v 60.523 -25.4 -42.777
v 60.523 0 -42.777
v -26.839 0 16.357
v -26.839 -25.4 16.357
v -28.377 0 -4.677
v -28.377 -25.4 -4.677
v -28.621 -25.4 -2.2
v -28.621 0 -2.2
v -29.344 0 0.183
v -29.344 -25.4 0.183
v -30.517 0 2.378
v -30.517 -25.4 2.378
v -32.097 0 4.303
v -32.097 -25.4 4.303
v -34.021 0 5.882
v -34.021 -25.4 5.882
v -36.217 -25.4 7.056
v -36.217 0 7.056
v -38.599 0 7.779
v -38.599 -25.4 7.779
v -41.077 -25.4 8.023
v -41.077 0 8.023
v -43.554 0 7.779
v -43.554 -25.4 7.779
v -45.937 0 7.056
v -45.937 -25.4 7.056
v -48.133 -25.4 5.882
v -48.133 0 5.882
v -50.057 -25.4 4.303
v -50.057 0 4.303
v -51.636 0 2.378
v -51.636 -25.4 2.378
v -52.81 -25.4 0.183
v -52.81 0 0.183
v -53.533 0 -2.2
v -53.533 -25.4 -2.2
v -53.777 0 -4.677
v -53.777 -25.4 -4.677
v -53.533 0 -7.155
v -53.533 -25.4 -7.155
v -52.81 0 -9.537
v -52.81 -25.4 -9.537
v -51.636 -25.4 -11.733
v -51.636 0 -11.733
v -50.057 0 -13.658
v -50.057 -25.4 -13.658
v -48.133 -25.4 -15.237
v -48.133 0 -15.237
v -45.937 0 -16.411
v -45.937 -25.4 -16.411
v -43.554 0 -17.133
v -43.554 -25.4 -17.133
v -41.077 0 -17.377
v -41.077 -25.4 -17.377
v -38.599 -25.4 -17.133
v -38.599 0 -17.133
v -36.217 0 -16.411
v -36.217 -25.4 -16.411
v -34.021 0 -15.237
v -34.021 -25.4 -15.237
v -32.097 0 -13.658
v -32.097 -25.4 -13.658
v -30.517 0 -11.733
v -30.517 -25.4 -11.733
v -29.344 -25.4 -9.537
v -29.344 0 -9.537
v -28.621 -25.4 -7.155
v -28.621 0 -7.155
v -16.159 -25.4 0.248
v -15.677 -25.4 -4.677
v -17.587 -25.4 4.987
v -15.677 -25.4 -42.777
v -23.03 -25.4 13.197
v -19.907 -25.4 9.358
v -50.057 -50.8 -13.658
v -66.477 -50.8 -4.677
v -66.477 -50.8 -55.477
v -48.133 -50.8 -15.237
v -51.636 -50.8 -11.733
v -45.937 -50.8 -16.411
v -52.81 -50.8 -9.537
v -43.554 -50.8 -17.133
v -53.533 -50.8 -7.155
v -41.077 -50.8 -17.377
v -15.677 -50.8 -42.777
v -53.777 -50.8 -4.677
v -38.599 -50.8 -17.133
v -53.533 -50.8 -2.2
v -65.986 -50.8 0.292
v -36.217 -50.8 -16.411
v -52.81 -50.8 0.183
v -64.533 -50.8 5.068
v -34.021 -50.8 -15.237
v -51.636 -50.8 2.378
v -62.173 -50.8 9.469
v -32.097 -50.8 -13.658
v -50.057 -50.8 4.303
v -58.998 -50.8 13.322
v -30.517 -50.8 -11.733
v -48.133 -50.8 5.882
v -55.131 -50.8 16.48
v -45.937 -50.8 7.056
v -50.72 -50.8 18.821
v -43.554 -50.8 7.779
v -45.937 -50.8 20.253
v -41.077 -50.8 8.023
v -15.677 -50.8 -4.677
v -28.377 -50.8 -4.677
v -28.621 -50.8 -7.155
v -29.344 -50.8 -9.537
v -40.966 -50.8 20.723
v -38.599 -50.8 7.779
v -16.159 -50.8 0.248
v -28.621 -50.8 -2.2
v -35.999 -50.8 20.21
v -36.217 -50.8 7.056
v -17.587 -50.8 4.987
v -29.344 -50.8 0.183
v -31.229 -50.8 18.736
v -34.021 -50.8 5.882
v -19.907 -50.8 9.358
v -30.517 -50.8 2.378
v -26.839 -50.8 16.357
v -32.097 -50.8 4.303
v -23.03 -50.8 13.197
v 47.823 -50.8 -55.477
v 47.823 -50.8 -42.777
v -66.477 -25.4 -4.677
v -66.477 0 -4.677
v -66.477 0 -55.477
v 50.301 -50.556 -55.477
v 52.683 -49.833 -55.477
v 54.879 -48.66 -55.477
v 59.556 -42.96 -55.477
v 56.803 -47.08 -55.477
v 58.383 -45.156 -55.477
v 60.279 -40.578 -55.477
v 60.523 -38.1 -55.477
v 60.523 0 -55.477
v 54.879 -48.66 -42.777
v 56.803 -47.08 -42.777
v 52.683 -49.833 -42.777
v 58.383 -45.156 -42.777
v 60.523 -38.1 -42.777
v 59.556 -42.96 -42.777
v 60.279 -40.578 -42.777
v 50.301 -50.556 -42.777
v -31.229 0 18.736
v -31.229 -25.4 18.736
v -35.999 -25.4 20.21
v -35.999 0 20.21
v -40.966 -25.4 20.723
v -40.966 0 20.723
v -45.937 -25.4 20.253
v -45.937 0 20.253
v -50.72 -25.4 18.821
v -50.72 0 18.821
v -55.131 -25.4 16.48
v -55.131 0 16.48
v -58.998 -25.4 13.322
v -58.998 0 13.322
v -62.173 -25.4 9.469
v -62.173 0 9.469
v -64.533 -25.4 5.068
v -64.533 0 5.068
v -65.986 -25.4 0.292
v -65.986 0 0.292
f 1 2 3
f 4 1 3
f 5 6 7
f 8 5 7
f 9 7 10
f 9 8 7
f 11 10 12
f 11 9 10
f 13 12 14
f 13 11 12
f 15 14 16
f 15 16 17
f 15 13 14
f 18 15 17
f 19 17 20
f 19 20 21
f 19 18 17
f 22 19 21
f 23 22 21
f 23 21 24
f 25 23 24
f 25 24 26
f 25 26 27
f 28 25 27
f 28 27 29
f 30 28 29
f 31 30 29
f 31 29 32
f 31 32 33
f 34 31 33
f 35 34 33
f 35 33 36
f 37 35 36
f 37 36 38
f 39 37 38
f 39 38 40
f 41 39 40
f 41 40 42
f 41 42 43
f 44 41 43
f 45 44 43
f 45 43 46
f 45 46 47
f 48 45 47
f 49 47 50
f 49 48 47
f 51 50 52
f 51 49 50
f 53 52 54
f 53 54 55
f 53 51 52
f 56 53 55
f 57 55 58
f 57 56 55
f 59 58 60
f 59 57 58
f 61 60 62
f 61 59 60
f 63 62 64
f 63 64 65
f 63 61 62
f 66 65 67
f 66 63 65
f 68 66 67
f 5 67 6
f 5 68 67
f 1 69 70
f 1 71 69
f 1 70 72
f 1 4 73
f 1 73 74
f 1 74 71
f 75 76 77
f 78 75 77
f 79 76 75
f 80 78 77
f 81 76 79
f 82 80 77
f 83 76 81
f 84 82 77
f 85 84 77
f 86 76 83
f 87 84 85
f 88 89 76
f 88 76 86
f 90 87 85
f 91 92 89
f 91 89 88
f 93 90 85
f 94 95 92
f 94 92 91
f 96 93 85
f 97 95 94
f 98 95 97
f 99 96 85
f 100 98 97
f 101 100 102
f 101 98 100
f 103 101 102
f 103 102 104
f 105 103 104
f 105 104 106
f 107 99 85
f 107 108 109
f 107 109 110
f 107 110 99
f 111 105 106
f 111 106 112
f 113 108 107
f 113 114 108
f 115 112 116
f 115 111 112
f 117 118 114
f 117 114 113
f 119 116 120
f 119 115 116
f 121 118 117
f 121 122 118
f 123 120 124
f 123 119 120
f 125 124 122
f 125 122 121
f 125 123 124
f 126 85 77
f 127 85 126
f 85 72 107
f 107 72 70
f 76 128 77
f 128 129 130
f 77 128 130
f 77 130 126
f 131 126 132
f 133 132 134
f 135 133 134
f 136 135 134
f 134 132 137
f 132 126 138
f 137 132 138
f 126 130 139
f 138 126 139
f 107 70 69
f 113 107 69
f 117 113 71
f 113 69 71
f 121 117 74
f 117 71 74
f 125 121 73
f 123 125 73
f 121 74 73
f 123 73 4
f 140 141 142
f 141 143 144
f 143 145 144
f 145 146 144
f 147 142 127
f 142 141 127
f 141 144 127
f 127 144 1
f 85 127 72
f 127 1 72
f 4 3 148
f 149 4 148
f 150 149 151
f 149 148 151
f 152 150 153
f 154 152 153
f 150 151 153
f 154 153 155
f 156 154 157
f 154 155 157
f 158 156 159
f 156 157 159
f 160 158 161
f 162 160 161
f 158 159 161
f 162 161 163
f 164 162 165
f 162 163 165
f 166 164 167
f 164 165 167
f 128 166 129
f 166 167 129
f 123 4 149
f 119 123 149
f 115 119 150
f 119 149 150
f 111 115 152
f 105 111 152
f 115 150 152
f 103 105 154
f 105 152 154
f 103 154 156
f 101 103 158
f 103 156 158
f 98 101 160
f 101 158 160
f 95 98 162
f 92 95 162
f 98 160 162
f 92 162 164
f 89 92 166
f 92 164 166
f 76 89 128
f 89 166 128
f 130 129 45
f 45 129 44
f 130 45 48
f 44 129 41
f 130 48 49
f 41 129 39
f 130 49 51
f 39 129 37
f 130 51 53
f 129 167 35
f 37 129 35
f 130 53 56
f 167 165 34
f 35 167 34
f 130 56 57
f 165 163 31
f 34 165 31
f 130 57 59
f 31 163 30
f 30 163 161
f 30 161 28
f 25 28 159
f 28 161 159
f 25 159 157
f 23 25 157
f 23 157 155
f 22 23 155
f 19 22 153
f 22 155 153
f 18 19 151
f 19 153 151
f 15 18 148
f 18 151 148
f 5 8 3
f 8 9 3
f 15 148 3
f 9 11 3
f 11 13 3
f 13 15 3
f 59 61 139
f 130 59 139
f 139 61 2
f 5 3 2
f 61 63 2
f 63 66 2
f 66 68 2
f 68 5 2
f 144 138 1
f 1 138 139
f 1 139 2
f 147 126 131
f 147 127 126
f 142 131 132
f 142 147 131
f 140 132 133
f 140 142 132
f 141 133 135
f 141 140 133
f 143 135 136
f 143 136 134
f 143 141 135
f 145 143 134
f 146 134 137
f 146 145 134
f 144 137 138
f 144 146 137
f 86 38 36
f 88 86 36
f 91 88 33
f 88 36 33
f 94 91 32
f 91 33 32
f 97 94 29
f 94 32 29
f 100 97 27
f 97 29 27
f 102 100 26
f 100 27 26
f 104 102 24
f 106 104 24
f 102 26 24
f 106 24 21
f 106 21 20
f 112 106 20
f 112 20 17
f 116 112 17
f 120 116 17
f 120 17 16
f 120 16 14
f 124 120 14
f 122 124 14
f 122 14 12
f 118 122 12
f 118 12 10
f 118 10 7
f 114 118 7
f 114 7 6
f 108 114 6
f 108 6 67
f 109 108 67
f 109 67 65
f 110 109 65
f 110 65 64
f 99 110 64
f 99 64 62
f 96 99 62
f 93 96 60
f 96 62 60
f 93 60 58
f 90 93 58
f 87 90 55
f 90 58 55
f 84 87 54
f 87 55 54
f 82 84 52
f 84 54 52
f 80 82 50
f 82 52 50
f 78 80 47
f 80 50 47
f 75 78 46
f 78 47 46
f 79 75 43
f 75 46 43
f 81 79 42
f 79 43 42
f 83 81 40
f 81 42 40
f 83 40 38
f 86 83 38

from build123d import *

# Parameters (mm, degrees)
F0_R     = 12.7
F1_DEPTH = 25.4
F3_DEPTH = 25.4
F4_DEPTH = 25.4
F5_R     = 12.7


with BuildPart() as f1:
    # F0 (on Front) → F1 (new body)
    with BuildSketch(Plane.XZ):
        with BuildLine():
            Line((60.523228, -42.777247), (-26.838899, 16.357082))
            ThreePointArc((-26.838899, 16.357082), (-52.983031, 17.759353), (-66.476772, -4.677247))
            Line((-66.476772, -4.677247), (-66.476772, -55.477247))
            Line((-66.476772, -55.477247), (60.523228, -55.477247))
            Line((60.523228, -55.477247), (60.523228, -42.777247))
        make_face()
        with Locations((-41.076772, -4.677247)):
            Circle(F0_R, mode=Mode.SUBTRACT)
    extrude(amount=F1_DEPTH)

    # F2 (on face) → F3 (join)
    with BuildSketch(Plane.XZ.offset(25.4)):
        with BuildLine():
            Line((-15.676772, -4.677247), (-28.376772, -4.677247))
            ThreePointArc((-28.376772, -4.677247), (-41.076772, -17.377247), (-53.776772, -4.677247))
            Line((-53.776772, -4.677247), (-66.476772, -4.677247))
            ThreePointArc((-66.476772, -4.677247), (-41.076772, -30.077247), (-15.676772, -4.677247))
        make_face()
        with BuildLine():
            ThreePointArc((-53.776772, -4.677247), (-41.076772, 8.022753), (-28.376772, -4.677247))
            Line((-28.376772, -4.677247), (-15.676772, -4.677247))
            ThreePointArc((-15.676772, -4.677247), (-41.076772, 20.722753), (-66.476772, -4.677247))
            Line((-66.476772, -4.677247), (-53.776772, -4.677247))
        make_face()
    extrude(amount=F3_DEPTH)

    # F2 (on face) → F4 (join)
    with BuildSketch(Plane.XZ.offset(25.4)):
        with BuildLine():
            Line((-15.676772, -4.677247), (-28.376772, -4.677247))
            ThreePointArc((-28.376772, -4.677247), (-41.076772, -17.377247), (-53.776772, -4.677247))
            Line((-53.776772, -4.677247), (-66.476772, -4.677247))
            ThreePointArc((-66.476772, -4.677247), (-41.076772, -30.077247), (-15.676772, -4.677247))
        make_face()
        with BuildLine():
            ThreePointArc((-53.776772, -4.677247), (-41.076772, 8.022753), (-28.376772, -4.677247))
            Line((-28.376772, -4.677247), (-15.676772, -4.677247))
            ThreePointArc((-15.676772, -4.677247), (-18.640173, 7.229013), (-26.838899, 16.357082))
            ThreePointArc((-26.838899, 16.357082), (-52.983031, 17.759353), (-66.476772, -4.677247))
            Line((-66.476772, -4.677247), (-53.776772, -4.677247))
        make_face()
        with BuildLine():
            Line((-15.676772, -42.777247), (-15.676772, -4.677247))
            ThreePointArc((-15.676772, -4.677247), (-41.076772, -30.077247), (-66.476772, -4.677247))
            Line((-66.476772, -4.677247), (-66.476772, -42.777247))
            Line((-66.476772, -42.777247), (-66.476772, -55.477247))
            Line((-66.476772, -55.477247), (60.523228, -55.477247))
            Line((60.523228, -55.477247), (60.523228, -42.777247))
            Line((60.523228, -42.777247), (-15.676772, -42.777247))
        make_face()
    extrude(amount=F4_DEPTH)

    # F5
    f5_edges = [f1.edges().sort_by_distance(p)[0] for p in [
        (60.523228, -50.8, -49.127247),
    ]]
    fillet(f5_edges, radius=F5_R)


solid = f1.part
